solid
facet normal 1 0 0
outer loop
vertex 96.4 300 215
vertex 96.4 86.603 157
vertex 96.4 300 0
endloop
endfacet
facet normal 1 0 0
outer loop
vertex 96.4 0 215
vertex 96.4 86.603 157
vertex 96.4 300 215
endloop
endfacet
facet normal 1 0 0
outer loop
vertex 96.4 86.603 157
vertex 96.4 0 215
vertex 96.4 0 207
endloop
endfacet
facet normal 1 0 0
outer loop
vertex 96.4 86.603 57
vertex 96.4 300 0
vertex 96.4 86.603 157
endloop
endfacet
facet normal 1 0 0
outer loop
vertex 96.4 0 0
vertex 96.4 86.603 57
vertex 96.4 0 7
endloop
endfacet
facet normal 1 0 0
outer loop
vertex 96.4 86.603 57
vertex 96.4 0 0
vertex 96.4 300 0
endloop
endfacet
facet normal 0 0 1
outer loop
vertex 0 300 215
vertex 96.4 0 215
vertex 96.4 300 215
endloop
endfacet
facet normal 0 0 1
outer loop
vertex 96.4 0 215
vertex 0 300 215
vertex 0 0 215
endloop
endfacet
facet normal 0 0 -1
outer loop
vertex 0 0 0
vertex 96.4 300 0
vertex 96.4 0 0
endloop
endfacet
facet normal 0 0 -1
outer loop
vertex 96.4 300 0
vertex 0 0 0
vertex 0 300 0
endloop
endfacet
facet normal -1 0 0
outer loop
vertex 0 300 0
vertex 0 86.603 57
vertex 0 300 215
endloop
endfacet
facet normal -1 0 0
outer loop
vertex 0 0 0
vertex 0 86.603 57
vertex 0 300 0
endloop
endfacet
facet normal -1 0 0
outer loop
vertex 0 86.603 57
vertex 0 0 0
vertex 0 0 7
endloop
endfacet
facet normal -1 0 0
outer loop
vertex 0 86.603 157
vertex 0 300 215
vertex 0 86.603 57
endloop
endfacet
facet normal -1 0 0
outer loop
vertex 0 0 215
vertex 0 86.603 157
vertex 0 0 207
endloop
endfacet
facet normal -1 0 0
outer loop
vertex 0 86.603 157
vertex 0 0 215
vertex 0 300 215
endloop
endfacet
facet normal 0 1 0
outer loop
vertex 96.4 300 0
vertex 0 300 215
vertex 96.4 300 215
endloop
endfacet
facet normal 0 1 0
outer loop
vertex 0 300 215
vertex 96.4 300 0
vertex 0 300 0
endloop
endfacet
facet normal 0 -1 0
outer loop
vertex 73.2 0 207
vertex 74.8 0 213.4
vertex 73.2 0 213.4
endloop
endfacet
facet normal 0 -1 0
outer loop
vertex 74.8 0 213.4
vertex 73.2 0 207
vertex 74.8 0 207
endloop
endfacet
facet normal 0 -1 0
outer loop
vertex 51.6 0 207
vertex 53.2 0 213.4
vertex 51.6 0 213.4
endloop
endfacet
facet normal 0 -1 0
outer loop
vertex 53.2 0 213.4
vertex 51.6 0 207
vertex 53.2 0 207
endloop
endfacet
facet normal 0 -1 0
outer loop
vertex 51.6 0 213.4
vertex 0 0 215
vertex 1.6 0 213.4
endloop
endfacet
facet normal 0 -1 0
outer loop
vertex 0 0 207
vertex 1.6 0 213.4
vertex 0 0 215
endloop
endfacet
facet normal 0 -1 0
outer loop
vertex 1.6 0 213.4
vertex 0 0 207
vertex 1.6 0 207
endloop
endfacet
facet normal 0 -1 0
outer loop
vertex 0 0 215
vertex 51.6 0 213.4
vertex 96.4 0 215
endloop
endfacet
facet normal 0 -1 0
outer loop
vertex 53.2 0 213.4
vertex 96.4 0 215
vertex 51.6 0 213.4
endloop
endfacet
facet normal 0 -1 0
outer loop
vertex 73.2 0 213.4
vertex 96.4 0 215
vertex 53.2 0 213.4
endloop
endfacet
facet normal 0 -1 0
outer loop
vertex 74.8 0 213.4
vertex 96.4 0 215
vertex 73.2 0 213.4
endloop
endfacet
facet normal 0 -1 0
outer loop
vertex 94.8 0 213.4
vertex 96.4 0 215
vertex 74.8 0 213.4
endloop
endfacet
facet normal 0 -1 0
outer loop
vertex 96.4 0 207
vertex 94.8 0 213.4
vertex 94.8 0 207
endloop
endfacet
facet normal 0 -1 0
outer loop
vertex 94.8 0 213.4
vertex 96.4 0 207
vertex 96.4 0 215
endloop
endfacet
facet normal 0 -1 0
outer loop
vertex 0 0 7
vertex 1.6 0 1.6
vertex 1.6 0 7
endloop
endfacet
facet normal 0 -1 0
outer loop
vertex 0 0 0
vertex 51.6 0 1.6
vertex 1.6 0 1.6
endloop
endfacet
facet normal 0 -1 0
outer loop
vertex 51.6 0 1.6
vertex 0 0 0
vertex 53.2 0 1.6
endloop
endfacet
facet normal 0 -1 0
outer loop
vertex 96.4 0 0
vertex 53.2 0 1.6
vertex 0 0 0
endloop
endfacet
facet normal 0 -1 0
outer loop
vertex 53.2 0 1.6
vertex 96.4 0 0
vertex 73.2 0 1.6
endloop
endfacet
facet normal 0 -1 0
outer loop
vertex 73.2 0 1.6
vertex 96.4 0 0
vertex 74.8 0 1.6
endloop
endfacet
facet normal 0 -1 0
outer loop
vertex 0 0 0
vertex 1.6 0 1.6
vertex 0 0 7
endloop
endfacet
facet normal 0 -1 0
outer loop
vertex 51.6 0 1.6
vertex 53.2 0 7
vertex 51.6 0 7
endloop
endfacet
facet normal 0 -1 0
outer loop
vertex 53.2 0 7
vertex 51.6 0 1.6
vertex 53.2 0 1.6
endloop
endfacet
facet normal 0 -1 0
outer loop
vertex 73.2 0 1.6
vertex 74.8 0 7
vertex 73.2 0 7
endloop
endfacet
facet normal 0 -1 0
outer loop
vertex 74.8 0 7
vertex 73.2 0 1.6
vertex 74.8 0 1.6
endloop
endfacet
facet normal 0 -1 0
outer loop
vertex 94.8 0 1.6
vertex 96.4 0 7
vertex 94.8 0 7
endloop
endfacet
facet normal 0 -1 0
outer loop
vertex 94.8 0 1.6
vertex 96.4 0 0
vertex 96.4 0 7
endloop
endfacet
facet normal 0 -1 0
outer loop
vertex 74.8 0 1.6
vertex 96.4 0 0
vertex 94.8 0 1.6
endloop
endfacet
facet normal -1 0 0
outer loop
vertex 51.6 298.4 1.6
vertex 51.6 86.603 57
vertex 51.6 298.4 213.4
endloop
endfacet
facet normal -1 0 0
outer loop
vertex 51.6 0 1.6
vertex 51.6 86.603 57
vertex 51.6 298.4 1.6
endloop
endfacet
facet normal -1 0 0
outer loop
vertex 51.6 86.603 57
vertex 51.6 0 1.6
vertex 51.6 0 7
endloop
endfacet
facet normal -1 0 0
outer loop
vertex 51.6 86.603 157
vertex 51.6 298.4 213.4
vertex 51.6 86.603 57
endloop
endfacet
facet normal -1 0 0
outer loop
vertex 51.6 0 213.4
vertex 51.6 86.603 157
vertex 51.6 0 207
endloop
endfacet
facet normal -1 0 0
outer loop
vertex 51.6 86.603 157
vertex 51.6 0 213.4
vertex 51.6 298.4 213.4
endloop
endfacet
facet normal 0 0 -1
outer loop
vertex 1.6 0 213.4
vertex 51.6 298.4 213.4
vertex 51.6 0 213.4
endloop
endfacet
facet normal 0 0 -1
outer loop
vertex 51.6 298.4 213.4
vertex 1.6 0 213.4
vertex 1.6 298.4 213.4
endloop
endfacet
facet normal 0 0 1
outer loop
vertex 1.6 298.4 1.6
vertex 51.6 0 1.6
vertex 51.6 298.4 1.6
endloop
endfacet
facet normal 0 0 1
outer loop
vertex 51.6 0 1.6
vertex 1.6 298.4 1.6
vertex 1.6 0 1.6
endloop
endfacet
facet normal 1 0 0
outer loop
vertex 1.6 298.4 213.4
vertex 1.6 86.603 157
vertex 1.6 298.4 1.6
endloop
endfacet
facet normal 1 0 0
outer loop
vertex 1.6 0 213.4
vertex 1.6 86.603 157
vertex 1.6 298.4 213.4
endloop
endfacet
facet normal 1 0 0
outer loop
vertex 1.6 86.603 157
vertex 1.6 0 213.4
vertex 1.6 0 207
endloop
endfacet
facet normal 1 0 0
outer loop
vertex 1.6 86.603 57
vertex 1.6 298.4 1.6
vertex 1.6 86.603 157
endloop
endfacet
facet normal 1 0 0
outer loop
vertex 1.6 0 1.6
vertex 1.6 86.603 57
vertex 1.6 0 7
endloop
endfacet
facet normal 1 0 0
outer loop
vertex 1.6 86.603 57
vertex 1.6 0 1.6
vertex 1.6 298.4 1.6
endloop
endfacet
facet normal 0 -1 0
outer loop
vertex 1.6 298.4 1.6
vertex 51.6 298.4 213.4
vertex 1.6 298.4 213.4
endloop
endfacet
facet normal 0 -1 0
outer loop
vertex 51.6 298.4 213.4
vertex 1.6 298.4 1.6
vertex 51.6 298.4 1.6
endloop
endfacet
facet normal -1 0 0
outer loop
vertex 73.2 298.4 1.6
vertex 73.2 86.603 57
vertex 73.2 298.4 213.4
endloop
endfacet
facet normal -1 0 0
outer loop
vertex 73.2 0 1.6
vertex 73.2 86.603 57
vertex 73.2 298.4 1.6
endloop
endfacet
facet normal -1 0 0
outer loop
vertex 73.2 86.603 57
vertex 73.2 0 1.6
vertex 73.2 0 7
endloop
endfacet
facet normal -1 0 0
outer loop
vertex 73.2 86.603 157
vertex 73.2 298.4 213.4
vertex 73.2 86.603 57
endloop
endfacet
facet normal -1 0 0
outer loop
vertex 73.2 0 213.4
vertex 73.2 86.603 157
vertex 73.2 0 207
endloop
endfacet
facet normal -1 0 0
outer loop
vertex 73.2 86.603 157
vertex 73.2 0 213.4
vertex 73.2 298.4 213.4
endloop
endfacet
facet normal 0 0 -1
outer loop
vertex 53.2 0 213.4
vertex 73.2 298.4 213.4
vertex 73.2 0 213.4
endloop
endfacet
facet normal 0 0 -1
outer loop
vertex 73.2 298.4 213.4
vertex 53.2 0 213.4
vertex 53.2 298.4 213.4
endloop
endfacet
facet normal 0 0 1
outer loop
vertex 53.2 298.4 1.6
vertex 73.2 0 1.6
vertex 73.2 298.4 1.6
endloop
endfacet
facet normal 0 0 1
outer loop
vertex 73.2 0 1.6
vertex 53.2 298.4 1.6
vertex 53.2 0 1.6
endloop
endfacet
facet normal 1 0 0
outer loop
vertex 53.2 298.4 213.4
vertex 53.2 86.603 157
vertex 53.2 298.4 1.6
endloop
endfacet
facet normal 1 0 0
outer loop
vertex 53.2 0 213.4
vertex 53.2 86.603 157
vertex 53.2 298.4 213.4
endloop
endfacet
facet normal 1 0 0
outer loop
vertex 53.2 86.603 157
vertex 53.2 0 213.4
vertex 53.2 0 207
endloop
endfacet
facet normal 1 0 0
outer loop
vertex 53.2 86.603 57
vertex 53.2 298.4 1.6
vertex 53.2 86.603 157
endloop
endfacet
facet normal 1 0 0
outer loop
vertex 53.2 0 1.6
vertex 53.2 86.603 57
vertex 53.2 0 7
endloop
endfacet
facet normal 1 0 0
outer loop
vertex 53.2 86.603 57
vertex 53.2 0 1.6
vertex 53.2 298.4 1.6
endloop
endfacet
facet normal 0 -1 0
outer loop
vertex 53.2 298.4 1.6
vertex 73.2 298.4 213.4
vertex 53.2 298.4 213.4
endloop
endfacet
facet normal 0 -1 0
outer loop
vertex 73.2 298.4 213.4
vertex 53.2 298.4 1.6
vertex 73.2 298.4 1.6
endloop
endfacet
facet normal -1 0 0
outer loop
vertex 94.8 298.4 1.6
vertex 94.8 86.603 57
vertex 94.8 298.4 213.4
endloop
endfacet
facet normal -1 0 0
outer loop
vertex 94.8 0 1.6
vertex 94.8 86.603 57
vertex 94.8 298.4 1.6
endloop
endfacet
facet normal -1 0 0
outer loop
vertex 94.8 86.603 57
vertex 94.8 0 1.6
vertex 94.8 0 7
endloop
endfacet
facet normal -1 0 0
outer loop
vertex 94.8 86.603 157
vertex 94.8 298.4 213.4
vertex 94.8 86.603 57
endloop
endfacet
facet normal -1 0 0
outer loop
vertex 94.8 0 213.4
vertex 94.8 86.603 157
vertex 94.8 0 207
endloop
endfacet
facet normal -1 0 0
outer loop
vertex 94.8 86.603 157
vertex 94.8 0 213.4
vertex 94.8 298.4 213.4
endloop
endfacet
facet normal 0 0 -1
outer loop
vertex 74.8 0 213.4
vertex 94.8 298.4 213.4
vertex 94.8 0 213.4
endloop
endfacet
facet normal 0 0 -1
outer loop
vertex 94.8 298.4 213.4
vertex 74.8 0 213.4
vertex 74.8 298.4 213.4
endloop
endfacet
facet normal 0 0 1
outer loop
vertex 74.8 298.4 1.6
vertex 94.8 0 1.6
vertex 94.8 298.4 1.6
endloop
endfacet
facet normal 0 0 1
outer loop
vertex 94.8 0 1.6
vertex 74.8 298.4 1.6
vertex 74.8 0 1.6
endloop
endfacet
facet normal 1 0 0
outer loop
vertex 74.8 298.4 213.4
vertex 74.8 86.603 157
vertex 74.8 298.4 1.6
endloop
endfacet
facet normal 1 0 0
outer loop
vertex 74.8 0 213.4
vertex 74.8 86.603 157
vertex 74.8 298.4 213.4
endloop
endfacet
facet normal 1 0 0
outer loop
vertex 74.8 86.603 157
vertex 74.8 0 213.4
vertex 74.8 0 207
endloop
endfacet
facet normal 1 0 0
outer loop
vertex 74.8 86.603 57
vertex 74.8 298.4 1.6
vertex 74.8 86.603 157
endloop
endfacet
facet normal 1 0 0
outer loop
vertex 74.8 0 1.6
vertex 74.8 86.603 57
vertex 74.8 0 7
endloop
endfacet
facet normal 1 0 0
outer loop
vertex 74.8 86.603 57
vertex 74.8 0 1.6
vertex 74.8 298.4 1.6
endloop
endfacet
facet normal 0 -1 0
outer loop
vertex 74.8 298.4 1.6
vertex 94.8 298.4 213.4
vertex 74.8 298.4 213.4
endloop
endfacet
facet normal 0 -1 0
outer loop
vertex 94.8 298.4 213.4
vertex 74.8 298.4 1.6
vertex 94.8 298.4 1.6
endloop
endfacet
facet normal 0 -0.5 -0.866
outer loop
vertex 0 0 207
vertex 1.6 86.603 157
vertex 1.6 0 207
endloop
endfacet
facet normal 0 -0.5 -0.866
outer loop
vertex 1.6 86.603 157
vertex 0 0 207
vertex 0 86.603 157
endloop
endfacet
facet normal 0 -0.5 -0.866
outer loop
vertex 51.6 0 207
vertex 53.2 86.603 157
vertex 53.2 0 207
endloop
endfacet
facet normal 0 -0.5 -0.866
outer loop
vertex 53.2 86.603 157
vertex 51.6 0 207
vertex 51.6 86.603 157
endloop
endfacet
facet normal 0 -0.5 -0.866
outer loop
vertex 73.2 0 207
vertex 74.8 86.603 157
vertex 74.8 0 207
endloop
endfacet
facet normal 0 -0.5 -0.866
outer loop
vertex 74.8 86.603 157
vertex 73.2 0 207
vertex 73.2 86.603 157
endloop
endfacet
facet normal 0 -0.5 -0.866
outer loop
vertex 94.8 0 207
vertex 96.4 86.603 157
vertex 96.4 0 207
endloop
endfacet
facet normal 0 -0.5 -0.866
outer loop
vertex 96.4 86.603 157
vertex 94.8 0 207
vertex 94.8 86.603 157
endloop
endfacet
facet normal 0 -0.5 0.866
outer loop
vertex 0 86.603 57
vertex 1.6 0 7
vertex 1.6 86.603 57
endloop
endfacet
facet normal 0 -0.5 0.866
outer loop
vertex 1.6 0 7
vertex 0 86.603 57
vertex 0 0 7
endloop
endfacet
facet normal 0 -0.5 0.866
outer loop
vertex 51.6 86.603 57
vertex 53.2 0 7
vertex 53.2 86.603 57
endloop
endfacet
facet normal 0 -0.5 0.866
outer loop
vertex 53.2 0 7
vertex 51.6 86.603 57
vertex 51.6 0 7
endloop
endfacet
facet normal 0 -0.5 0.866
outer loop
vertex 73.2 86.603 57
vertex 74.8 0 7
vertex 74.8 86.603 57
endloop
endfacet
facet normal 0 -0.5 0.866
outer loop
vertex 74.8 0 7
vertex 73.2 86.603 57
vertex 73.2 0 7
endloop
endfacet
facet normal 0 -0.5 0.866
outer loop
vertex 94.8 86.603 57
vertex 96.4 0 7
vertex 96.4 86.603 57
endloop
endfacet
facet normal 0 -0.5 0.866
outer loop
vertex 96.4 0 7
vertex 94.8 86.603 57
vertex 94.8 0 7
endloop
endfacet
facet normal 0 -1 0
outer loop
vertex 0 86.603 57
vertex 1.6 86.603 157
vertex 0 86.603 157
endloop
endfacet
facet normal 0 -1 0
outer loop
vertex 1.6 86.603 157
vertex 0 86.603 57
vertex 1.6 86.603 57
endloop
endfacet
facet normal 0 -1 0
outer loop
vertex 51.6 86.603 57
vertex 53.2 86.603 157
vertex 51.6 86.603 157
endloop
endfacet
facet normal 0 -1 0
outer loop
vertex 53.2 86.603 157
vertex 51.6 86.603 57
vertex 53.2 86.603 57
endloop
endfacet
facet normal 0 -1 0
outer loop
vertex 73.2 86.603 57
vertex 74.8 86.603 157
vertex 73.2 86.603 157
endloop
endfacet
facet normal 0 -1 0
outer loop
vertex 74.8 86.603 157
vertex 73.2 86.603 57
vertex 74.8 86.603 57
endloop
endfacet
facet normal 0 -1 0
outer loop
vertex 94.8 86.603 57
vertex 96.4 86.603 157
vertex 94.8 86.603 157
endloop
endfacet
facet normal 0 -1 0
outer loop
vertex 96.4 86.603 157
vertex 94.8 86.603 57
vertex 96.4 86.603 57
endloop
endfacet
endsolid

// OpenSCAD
// din-a4: 210x297

// organizer for cupboard


h=215;
d=300;
s=1.6;

w=50+20+20+4*s;

difference(){
    cube([w, d, h]);
    
    translate([s,-s,s])
    cube([50, d, h-2*s]); // packung druckerpapier 5cm
    
    translate([s+50+s, -s, s])
    cube([20, d, h-2*s]);
    
    translate([s+50+s+20+s, -s, s])
    cube([20, d, h-2*s]);
    
    translate([-5,0,107])
    rotate([0,90,0])
    cylinder(r=100, h=150, $fn=6);
}
